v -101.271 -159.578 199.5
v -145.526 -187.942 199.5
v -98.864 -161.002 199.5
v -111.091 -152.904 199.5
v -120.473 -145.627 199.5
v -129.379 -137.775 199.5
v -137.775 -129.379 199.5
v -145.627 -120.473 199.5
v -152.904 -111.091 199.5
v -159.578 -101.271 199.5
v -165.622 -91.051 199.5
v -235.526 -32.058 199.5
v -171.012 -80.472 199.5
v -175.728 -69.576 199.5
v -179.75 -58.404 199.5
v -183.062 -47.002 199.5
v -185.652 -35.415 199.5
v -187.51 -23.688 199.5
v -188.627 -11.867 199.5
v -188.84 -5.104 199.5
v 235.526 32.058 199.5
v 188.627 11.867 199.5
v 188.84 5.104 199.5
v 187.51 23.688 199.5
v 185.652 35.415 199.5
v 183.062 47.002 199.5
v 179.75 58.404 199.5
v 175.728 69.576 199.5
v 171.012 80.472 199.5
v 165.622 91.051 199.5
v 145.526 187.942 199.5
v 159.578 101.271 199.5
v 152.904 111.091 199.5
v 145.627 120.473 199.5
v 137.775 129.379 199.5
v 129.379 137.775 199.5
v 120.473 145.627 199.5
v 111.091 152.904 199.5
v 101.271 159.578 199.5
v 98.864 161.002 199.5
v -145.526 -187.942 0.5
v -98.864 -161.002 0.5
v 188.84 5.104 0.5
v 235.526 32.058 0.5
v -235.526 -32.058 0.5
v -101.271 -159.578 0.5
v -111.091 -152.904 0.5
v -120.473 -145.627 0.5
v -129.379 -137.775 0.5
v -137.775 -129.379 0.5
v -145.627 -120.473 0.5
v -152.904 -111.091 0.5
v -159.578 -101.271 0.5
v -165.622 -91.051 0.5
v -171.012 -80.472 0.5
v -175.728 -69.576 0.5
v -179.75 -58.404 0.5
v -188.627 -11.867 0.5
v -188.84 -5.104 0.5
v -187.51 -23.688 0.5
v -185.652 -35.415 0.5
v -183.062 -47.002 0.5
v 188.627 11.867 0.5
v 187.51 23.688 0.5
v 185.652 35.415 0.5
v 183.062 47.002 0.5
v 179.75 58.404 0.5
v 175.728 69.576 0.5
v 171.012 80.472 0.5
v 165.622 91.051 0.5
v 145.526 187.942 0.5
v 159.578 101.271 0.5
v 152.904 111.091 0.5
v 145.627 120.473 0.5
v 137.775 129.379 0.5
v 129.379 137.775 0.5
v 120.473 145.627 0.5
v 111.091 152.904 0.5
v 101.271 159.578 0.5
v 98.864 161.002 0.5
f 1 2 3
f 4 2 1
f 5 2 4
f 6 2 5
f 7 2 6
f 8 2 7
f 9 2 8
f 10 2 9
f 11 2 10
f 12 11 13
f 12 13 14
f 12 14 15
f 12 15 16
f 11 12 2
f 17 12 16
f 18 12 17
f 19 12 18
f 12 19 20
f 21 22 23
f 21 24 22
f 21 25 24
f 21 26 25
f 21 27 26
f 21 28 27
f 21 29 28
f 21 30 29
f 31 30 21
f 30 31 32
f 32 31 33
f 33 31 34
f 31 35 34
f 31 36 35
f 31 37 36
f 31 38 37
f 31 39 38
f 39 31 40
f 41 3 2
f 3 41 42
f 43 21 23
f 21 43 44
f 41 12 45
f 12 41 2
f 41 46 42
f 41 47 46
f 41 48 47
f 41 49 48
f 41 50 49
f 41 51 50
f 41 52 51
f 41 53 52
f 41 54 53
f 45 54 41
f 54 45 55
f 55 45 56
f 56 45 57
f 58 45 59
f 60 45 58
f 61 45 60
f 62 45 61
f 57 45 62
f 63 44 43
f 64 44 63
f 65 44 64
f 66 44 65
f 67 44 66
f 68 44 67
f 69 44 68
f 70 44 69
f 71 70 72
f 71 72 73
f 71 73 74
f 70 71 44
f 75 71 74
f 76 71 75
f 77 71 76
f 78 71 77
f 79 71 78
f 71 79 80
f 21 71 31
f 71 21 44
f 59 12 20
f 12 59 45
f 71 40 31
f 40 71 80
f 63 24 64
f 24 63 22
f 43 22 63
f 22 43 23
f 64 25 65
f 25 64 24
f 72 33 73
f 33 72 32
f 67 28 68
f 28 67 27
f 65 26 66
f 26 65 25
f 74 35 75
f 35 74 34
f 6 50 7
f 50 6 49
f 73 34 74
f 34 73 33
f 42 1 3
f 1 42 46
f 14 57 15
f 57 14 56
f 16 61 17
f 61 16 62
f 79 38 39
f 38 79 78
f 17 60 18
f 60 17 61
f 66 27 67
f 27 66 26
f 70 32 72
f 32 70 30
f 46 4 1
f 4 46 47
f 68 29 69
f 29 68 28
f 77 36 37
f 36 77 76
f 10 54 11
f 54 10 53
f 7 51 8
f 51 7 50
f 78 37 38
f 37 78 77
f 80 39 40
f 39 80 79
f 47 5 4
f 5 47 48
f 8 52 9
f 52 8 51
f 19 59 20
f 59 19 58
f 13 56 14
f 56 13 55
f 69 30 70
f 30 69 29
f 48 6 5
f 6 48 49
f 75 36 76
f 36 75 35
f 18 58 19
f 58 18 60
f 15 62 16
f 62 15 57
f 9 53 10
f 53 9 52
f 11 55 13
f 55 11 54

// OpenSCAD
difference() {
rotate([0,0,120]){translate([0,0,100]){cube([180,440,199], center = true);}}
translate([0,0,100]) {cylinder (r = 189, h = 199, $fn = 100, center = true);}

union() {
linear_extrude(height = 200, twist = 90, $fn = 400) translate([-50,-100,0]){import(file = "wing.dxf", center = false, $fn = 100);} rotate([0,30,0]);

rotate([0,0,90]) {linear_extrude(height = 200, twist = 90, $fn = 400) translate([-50,-100,0]){import(file = "wing.dxf", center = false, $fn = 100);} rotate([0,30,0]);}

rotate([0,0,180]) {linear_extrude(height = 200, twist = 90, $fn = 400) translate([-50,-100,0]){import(file = "wing.dxf", center = false, $fn = 100);} rotate([0,30,0]);}

rotate([0,0,270]) {linear_extrude(height = 200, twist = 90, $fn = 400) translate([-50,-100,0]){import(file = "wing.dxf", center = false, $fn = 100);} rotate([0,30,0]);}
}
cylinder(h = 400, r = 180, center = true, $fn = 6);
}
